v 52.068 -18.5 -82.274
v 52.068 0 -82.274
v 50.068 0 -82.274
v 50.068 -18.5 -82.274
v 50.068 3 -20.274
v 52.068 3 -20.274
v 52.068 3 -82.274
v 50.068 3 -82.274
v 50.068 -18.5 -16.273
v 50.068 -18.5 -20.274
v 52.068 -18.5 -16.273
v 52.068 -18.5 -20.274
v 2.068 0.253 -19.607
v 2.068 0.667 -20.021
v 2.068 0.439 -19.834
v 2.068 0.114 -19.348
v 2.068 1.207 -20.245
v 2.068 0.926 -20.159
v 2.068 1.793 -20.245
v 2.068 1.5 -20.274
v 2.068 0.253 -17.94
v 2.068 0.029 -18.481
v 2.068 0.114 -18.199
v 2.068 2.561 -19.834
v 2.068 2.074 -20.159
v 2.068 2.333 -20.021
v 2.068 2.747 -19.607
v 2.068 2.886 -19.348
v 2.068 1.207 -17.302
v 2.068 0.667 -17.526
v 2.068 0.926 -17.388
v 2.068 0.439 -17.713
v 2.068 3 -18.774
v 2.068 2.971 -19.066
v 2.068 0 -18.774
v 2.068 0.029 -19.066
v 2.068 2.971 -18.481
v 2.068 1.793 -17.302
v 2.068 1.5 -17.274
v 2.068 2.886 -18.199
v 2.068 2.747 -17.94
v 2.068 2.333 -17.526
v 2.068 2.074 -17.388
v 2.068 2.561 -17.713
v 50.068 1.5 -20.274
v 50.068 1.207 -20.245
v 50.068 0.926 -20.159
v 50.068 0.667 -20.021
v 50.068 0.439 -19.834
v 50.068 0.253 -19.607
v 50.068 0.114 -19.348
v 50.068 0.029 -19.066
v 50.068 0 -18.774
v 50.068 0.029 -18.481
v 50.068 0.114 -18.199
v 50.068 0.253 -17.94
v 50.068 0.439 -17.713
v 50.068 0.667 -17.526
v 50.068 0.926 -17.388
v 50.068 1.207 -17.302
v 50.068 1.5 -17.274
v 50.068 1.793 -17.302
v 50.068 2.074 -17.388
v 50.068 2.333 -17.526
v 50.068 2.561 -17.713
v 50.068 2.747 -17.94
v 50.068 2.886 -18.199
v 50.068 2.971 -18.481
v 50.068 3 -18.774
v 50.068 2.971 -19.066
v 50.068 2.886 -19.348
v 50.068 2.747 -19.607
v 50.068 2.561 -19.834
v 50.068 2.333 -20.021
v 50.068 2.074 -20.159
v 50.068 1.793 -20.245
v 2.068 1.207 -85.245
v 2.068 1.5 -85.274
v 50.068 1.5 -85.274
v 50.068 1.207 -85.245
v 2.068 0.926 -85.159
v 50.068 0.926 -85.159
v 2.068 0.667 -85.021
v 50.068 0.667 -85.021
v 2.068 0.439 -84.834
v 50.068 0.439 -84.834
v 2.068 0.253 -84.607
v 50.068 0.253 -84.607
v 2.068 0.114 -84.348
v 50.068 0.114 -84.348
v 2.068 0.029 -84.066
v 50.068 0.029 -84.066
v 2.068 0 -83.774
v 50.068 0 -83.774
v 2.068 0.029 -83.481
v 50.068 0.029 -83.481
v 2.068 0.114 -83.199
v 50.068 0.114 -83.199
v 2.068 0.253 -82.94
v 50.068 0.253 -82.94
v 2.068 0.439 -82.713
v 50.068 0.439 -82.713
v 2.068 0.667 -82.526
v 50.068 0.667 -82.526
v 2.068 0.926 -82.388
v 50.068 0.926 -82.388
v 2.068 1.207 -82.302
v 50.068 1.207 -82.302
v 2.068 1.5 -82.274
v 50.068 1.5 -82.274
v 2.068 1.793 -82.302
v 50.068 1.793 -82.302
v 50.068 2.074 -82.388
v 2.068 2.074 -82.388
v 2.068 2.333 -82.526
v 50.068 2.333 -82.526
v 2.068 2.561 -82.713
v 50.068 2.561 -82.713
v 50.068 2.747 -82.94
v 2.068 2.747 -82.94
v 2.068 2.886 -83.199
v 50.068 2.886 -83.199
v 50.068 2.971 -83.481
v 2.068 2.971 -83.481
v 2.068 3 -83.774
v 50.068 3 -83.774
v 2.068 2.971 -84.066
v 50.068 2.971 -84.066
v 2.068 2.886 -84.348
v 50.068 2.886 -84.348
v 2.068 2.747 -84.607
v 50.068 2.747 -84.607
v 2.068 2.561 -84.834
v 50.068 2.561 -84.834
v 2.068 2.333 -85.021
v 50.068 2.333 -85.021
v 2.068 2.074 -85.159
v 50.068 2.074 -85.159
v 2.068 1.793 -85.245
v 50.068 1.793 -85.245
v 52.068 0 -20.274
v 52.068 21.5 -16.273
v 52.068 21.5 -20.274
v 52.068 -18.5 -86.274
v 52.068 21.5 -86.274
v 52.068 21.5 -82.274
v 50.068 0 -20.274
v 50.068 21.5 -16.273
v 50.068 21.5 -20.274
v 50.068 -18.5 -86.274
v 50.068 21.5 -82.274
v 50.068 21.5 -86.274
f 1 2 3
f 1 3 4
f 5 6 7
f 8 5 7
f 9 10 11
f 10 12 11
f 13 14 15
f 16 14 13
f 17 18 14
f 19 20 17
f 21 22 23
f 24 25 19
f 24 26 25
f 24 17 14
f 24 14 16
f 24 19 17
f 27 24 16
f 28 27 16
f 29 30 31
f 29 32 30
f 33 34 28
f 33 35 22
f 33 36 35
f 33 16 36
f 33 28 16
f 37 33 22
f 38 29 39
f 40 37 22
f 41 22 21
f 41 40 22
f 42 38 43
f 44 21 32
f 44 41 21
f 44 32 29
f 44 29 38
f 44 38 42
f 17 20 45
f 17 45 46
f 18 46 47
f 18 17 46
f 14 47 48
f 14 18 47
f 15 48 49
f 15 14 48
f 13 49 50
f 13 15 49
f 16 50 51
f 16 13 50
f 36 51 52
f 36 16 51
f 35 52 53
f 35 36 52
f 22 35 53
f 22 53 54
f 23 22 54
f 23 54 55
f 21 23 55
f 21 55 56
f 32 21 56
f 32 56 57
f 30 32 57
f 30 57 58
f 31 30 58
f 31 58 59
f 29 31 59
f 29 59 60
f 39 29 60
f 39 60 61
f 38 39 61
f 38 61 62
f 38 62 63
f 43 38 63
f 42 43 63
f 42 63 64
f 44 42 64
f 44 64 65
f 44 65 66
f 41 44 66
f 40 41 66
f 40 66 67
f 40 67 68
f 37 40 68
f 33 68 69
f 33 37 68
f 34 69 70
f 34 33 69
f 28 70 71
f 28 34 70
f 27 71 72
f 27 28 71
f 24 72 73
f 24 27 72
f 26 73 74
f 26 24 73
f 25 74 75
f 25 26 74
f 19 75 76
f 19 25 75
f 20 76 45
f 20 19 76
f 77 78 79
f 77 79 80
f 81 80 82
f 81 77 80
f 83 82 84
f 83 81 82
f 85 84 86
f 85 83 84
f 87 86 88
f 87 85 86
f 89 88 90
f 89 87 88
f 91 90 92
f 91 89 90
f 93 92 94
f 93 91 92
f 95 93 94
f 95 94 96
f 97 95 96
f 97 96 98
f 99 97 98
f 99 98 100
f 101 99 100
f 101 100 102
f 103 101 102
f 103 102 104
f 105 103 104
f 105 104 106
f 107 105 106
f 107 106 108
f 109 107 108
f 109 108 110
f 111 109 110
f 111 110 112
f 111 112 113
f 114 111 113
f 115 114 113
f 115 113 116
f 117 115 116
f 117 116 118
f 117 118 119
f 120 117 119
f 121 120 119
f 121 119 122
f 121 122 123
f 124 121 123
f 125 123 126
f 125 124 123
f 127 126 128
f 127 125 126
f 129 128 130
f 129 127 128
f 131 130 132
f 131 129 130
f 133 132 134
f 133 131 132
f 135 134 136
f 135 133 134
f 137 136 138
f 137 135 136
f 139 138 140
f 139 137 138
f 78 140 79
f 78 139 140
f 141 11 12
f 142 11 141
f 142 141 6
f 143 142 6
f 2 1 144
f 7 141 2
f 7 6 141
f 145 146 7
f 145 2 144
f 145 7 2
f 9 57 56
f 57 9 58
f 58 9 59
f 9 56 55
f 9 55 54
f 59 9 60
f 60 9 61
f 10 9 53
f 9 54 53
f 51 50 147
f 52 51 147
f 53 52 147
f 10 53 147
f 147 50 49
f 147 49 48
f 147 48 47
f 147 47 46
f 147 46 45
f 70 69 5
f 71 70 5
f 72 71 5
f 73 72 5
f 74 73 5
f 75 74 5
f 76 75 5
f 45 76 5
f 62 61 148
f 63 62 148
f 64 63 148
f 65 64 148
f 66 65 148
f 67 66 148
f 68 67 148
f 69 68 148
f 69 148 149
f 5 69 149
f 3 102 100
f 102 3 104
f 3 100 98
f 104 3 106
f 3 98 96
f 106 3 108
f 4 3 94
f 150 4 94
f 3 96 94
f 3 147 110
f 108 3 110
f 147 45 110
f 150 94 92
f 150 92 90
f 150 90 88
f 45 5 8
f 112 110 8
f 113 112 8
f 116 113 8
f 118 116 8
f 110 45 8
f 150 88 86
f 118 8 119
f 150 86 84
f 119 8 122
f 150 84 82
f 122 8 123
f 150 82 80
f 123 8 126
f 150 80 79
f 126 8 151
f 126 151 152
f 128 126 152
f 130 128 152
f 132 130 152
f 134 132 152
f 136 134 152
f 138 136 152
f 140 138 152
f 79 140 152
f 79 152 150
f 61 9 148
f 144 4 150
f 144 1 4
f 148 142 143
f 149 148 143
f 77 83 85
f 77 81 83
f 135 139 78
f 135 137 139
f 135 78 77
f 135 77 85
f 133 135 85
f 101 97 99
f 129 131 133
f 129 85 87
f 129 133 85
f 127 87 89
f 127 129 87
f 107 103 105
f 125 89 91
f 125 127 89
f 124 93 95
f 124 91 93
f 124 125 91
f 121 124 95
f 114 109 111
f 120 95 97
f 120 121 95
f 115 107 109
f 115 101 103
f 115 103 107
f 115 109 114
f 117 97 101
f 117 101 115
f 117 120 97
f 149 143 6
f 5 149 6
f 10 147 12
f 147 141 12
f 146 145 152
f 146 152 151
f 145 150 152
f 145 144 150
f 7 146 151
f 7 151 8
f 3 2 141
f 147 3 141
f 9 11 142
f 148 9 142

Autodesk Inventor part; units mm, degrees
ref_plane "YZ Plane" through (0, 0, 0) normal (1, 0, 0) x (0, 1, 0)
ref_plane "XZ Plane" through (0, 0, 0) normal (0, 1, 0) x (-1, 0, 0)
ref_plane "XY Plane" through (0, 0, 0) normal (0, 0, 1) x (1, 0, 0)
sketch "Skizze1" plane through (0, 0, 0) normal (0, 1, 0) x (-1, 0, 0)
  line L0 (37.9316, -16.2735) -> (-2.0684, -16.2735)
  line L1 (-2.0684, -16.2735) -> (-2.0684, -86.2735)
  line L2 (-2.0684, -86.2735) -> (37.9316, -86.2735)
  line L3 (37.9316, -86.2735) -> (37.9316, -16.2735)
  point P0 (0, 0)
  dimension "d0" = 70
  dimension "d1" = 40
extrude "Extrusion1" add sketch "Skizze1" along normal blind 3
fillet "Rundung1" radius 1 4 edges at (-37.9316, 1.5, -16.2735) (-37.9316, 1.5, -86.2735) (2.0684, 1.5, -86.2735) (2.0684, 1.5, -16.2735)
sketch "Skizze2" plane through (2.0684, 0, -17.2735) normal (1, 0, 0) x (0, 0, -1)
  circle A0 centre (1.5, 1.5) radius 1.5
  circle A1 centre (66.5, 1.5) radius 1.5
  line L0 (0, 3) -> (68, 3) projected
  line L1 (0, 0) -> (0, 3) projected
  line L2 (68, 3) -> (68, 0) projected
  point P0 (-17.2735, 0)
  dimension "d5" = 3
  dimension "d6" = 3
  dimension "d7" = 1.5
  dimension "d8" = 1.5
  dimension "d9" = 1.5
  dimension "d10" = 1.5
extrude "Extrusion2" add sketch "Skizze2" along normal blind 50 contours A0 | A1
sketch "Skizze3" plane through (52.0684, 1.5, -18.7735) normal (1, 0, 0) x (0, 0, -1)
  line L0 (-2.5, 1.5) -> (67.5, 1.5)
  line L1 (67.5, 1.5) -> (67.5, -1.5)
  line L2 (67.5, -1.5) -> (-2.5, -1.5)
  line L3 (-2.5, -1.5) -> (-2.5, 1.5)
  circle A0 centre (0, 0) radius 1.5 projected
  circle A1 centre (65, 0) radius 1.5 projected
  line L4 (-2.5, 20) -> (1.5, 20)
  line L5 (1.5, 20) -> (1.5, -20)
  line L6 (1.5, -20) -> (-2.5, -20)
  line L7 (-2.5, -20) -> (-2.5, 20)
  line L8 (67.5, 20) -> (63.5, 20)
  line L9 (63.5, 20) -> (63.5, -20)
  line L10 (63.5, -20) -> (67.5, -20)
  line L11 (67.5, -20) -> (67.5, 20)
  point P0 (-18.7735, -1.5)
  dimension "d13" = 1.5
  dimension "d14" = 1.5
  dimension "d16" = 2.5
  dimension "d17" = 2.5
  dimension "d20" = 40
  dimension "d21" = 20
extrude "Extrusion4" add sketch "Skizze3" against normal blind 2
sketch "Skizze4" plane through (0, 3, 0) normal (0, 1, 0) x (1, 0, 0)
  line L0 (2.0684, 14.6832) -> (-41.6445, 14.6832)
  line L1 (-41.6445, 14.6832) -> (-41.6445, 91.2635)
  line L2 (-41.6445, 91.2635) -> (2.0684, 91.2635)
  line L3 (2.0684, 91.2635) -> (2.0684, 14.6832)
  point P0 (0, 0)
extrude "Extrusion5" cut sketch "Skizze4" against normal blind 10
properties part number "Spielstraßenschild_Teil_Unten"
